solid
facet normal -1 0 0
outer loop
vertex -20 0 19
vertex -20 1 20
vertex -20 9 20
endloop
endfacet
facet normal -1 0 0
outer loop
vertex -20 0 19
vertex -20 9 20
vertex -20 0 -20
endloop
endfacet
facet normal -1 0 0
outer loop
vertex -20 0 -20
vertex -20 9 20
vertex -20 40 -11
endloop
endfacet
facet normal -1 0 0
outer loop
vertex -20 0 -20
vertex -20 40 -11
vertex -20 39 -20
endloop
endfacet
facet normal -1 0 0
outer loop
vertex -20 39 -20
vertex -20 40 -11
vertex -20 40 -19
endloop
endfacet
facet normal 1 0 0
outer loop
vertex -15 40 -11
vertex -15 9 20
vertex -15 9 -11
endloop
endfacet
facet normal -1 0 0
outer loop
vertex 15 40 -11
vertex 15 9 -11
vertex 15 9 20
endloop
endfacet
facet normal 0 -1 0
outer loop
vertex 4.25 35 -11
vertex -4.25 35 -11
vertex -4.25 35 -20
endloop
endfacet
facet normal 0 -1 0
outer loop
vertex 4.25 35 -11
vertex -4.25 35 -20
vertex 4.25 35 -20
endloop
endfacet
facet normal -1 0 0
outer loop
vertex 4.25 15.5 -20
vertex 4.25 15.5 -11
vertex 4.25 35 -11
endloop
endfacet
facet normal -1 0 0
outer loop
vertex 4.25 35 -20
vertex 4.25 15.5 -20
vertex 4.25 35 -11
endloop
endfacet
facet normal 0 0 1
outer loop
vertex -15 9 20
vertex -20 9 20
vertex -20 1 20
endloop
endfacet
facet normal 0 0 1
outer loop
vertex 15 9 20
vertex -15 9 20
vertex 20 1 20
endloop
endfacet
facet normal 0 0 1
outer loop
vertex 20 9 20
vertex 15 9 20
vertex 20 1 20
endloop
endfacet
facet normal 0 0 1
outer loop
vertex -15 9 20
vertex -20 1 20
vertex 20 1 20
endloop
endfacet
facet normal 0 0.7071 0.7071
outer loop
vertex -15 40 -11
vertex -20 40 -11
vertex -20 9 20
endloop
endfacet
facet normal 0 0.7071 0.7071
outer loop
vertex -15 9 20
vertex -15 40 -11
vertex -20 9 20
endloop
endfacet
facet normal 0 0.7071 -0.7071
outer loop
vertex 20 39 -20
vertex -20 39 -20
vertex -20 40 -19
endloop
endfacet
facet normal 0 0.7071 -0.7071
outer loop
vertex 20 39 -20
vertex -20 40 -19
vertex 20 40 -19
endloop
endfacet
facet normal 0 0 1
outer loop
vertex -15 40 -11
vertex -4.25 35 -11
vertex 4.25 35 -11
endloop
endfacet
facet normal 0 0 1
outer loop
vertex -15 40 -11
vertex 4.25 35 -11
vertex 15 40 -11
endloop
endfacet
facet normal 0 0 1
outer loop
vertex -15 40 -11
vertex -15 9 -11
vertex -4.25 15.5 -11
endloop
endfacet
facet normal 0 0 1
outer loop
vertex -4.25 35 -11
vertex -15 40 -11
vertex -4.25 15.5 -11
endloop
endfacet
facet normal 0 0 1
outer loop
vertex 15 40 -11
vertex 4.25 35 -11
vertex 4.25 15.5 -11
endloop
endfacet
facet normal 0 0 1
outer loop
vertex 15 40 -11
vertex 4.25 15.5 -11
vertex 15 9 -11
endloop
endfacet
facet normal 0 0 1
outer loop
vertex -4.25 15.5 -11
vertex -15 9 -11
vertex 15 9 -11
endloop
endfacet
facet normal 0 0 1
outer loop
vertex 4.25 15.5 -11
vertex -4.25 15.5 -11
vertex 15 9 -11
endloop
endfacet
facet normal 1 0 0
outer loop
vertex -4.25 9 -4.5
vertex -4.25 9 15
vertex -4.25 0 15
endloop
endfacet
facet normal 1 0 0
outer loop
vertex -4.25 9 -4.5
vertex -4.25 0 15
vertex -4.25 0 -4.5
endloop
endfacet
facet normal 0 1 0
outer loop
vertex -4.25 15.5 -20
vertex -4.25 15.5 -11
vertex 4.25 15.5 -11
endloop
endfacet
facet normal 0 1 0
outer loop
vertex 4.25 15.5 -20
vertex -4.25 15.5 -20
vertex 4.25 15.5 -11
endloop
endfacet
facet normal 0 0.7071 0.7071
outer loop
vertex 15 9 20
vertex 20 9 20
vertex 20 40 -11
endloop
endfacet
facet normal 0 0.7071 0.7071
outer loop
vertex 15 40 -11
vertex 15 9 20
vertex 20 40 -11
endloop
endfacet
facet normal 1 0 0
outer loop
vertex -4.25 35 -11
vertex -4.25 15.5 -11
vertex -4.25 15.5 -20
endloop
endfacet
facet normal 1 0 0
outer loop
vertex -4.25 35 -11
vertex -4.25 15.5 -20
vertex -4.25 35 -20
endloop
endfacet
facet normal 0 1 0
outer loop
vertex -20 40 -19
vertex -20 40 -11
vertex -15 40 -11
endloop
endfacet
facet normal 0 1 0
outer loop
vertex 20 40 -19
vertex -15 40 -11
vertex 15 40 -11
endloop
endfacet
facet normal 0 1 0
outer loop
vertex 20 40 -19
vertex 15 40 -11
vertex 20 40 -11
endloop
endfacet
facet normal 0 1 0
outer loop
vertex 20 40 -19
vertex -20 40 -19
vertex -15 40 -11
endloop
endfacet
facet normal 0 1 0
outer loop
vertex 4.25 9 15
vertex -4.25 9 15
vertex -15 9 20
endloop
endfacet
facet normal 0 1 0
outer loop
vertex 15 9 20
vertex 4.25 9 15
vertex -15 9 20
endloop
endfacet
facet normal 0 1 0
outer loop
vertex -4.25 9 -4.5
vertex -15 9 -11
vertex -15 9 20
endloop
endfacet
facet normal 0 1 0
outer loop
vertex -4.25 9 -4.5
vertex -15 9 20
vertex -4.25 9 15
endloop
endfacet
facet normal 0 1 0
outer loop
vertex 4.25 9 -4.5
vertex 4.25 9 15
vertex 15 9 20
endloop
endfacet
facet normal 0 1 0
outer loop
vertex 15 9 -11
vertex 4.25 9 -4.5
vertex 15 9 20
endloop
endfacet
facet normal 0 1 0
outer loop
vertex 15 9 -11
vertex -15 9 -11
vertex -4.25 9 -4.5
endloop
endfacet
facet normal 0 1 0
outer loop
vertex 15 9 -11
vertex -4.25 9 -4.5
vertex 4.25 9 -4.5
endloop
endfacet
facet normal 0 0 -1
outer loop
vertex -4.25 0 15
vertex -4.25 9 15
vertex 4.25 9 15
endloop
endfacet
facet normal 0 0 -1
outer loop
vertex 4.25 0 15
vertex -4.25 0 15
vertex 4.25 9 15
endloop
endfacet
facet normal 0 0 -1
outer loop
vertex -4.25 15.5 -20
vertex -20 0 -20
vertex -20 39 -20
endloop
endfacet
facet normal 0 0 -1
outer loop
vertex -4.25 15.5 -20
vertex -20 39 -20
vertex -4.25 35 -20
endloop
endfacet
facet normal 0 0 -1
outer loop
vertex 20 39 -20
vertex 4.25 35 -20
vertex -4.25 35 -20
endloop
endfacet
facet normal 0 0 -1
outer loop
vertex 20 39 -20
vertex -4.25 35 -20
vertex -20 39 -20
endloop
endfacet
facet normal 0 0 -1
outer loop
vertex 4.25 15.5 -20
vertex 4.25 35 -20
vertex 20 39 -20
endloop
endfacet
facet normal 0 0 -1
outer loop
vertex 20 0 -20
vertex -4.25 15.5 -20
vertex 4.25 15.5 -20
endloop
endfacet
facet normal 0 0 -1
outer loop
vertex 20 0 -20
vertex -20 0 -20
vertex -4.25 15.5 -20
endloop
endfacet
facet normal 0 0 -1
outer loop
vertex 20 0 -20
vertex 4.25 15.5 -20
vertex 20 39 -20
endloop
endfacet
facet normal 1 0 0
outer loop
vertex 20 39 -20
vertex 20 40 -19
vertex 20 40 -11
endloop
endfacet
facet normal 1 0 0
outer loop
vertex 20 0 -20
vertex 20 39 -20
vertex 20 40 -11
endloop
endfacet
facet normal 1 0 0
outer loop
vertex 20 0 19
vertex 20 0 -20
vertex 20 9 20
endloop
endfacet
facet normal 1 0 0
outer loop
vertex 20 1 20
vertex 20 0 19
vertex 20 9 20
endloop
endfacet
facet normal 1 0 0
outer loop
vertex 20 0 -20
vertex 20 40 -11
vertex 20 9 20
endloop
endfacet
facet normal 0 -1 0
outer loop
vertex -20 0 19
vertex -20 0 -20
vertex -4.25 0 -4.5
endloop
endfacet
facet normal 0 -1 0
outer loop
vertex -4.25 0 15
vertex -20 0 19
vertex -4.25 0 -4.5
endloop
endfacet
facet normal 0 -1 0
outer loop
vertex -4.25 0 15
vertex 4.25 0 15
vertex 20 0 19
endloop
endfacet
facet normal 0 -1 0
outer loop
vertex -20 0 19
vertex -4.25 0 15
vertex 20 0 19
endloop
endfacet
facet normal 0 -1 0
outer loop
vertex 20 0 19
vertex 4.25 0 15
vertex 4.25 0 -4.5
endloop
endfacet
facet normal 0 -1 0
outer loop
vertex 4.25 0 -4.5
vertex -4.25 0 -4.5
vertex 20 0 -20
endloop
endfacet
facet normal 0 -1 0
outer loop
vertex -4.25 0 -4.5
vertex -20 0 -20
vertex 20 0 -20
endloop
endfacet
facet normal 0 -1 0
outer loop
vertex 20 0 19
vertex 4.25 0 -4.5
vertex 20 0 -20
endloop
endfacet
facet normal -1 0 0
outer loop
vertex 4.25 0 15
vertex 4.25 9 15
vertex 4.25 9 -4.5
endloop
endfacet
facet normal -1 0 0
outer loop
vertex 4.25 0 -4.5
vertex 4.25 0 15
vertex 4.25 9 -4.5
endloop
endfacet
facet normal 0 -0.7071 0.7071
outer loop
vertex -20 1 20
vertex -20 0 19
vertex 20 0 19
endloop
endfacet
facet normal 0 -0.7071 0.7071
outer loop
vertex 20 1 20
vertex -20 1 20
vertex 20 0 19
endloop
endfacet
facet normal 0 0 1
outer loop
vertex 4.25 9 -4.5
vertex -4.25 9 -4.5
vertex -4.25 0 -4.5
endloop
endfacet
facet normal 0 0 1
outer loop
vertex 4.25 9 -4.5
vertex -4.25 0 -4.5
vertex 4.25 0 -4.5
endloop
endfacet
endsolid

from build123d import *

# Parameters (mm, degrees)
SKETCH1_W           = 40
SKETCH1_H           = 40
BOSS_EXTRUDE1_DEPTH = 9
SKETCH2_W           = 40
SKETCH2_H           = 9
BOSS_EXTRUDE2_DEPTH = 31
SKETCH3_W           = 8.5
SKETCH3_H           = 19.5
CUT_EXTRUDE1_DEPTH  = 42.964270517
SKETCH4_W           = 8.5
SKETCH4_H           = 19.5
CUT_EXTRUDE2_DEPTH  = 55.415071442
BOSS_EXTRUDE3_DEPTH = 5
BOSS_EXTRUDE4_DEPTH = 5
CHAMFER1_SIZE       = 1


with BuildPart() as part:
    # Sketch1 → Boss-Extrude1 (new body)
    with BuildSketch(Plane(origin=(0, 0, 0), x_dir=(1, 0, 0), z_dir=(0, 1, 0))):
        Rectangle(SKETCH1_W, SKETCH1_H)
    extrude(amount=BOSS_EXTRUDE1_DEPTH)

    # Sketch2 → Boss-Extrude2 (add)
    with BuildSketch(Plane(origin=(0, 9, 0), x_dir=(1, 0, 0), z_dir=(0, 1, 0))):
        with Locations((0, 15.5)):
            Rectangle(SKETCH2_W, SKETCH2_H)
    extrude(amount=BOSS_EXTRUDE2_DEPTH)

    # Sketch3 → Cut-Extrude1 (cut, through all)
    with BuildSketch(Plane(origin=(0, 9, 0), x_dir=(1, 0, 0), z_dir=(0, 1, 0))):
        with Locations((0, -5.25)):
            Rectangle(SKETCH3_W, SKETCH3_H)
    extrude(amount=-CUT_EXTRUDE1_DEPTH, mode=Mode.SUBTRACT)

    # Sketch4 → Cut-Extrude2 (cut, through all)
    with BuildSketch(Plane.XY.offset(-11)):
        with Locations((0, 25.25)):
            Rectangle(SKETCH4_W, SKETCH4_H)
    extrude(amount=-CUT_EXTRUDE2_DEPTH, mode=Mode.SUBTRACT)

    # Sketch5 → Boss-Extrude3 (add)
    with BuildSketch(Plane.ZY.offset(20)):
        Polygon((-11, 40), (20, 9), (-11, 9), align=None)
    extrude(amount=-BOSS_EXTRUDE3_DEPTH)

    # Sketch6 → Boss-Extrude4 (add)
    with BuildSketch(Plane(origin=(20, 0, 0), x_dir=(0, 0, -1), z_dir=(1, 0, 0))):
        Polygon((-20, 9), (11, 40), (11, 9), align=None)
    extrude(amount=-BOSS_EXTRUDE4_DEPTH)

    # Chamfer1
    chamfer1_edges = [part.edges().sort_by_distance(p)[0] for p in [
        (0, 40, -20),
        (0, 0, 20),
    ]]
    chamfer(chamfer1_edges, length=CHAMFER1_SIZE)


solid = part.part
